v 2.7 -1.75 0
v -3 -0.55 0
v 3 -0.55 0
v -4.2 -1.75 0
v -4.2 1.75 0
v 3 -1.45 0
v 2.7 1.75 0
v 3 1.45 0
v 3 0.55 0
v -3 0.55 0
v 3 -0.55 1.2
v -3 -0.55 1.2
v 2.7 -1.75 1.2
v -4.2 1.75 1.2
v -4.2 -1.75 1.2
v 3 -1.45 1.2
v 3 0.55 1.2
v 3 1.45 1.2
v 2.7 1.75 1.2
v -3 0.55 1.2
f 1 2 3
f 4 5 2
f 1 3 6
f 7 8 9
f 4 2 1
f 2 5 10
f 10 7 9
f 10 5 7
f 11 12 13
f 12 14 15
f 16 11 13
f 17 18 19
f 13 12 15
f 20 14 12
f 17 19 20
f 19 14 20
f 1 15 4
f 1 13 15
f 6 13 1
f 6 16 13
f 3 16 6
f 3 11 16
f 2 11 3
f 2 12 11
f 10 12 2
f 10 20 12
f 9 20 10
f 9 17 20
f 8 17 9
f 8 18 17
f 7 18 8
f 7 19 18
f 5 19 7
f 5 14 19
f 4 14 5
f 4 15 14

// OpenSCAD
// u-pin — holds a charm's stem (models/stem) in the bracelet.
//
// A flat U. Its two legs slide along the band through the charm bar, either
// side of the stem's neck and just over its foot, until the closed end (the
// bight) meets the bar's face. The legs' tips then sit flush with the bar's
// far face.
//
// TO FIT OR REMOVE IT, fold the joint BEFORE the charm bar — the one on the
// bight's side — forward, the way a wrist bends it, but to ~80-85 degrees.
// Until then the lock tooth on that bar leaves the U-pin only 2.0-2.8 mm to
// move (by wrist size), and it needs 4.75 to let the stem go. On a wrist a
// joint turns ~36.
// Push it out from the far side with a toothpick on the leg tips.
//
// PRINT IT LYING FLAT, exactly as modelled.
//
// All the geometry and every number live in lib/charm-stem.scad. It is drawn
// for a 6.0 mm bar, the bracelet's `body`.

$fa = 2;
$fs = 0.3;

include <../../lib/charm-stem.scad>

body    = 6.0;    // the bar it goes through, along the band — bracelet.scad's `body`
copies  = 1;      // how many to lay out; `-D copies=3` for a batch
spacing = 2*st_co + 3;

assert(copies >= 1, "copies must be at least 1");

echo(str("U-pin: ", body + st_bight, " x ", 2*st_co, " x ", st_ch,
         " mm, legs ", st_lw, " wide, ", 2*st_ci, " apart inside"));

for (i = [0 : copies - 1])
    translate([0, i * spacing, 0]) linear_extrude(st_ch) st_upin_2d(body);
